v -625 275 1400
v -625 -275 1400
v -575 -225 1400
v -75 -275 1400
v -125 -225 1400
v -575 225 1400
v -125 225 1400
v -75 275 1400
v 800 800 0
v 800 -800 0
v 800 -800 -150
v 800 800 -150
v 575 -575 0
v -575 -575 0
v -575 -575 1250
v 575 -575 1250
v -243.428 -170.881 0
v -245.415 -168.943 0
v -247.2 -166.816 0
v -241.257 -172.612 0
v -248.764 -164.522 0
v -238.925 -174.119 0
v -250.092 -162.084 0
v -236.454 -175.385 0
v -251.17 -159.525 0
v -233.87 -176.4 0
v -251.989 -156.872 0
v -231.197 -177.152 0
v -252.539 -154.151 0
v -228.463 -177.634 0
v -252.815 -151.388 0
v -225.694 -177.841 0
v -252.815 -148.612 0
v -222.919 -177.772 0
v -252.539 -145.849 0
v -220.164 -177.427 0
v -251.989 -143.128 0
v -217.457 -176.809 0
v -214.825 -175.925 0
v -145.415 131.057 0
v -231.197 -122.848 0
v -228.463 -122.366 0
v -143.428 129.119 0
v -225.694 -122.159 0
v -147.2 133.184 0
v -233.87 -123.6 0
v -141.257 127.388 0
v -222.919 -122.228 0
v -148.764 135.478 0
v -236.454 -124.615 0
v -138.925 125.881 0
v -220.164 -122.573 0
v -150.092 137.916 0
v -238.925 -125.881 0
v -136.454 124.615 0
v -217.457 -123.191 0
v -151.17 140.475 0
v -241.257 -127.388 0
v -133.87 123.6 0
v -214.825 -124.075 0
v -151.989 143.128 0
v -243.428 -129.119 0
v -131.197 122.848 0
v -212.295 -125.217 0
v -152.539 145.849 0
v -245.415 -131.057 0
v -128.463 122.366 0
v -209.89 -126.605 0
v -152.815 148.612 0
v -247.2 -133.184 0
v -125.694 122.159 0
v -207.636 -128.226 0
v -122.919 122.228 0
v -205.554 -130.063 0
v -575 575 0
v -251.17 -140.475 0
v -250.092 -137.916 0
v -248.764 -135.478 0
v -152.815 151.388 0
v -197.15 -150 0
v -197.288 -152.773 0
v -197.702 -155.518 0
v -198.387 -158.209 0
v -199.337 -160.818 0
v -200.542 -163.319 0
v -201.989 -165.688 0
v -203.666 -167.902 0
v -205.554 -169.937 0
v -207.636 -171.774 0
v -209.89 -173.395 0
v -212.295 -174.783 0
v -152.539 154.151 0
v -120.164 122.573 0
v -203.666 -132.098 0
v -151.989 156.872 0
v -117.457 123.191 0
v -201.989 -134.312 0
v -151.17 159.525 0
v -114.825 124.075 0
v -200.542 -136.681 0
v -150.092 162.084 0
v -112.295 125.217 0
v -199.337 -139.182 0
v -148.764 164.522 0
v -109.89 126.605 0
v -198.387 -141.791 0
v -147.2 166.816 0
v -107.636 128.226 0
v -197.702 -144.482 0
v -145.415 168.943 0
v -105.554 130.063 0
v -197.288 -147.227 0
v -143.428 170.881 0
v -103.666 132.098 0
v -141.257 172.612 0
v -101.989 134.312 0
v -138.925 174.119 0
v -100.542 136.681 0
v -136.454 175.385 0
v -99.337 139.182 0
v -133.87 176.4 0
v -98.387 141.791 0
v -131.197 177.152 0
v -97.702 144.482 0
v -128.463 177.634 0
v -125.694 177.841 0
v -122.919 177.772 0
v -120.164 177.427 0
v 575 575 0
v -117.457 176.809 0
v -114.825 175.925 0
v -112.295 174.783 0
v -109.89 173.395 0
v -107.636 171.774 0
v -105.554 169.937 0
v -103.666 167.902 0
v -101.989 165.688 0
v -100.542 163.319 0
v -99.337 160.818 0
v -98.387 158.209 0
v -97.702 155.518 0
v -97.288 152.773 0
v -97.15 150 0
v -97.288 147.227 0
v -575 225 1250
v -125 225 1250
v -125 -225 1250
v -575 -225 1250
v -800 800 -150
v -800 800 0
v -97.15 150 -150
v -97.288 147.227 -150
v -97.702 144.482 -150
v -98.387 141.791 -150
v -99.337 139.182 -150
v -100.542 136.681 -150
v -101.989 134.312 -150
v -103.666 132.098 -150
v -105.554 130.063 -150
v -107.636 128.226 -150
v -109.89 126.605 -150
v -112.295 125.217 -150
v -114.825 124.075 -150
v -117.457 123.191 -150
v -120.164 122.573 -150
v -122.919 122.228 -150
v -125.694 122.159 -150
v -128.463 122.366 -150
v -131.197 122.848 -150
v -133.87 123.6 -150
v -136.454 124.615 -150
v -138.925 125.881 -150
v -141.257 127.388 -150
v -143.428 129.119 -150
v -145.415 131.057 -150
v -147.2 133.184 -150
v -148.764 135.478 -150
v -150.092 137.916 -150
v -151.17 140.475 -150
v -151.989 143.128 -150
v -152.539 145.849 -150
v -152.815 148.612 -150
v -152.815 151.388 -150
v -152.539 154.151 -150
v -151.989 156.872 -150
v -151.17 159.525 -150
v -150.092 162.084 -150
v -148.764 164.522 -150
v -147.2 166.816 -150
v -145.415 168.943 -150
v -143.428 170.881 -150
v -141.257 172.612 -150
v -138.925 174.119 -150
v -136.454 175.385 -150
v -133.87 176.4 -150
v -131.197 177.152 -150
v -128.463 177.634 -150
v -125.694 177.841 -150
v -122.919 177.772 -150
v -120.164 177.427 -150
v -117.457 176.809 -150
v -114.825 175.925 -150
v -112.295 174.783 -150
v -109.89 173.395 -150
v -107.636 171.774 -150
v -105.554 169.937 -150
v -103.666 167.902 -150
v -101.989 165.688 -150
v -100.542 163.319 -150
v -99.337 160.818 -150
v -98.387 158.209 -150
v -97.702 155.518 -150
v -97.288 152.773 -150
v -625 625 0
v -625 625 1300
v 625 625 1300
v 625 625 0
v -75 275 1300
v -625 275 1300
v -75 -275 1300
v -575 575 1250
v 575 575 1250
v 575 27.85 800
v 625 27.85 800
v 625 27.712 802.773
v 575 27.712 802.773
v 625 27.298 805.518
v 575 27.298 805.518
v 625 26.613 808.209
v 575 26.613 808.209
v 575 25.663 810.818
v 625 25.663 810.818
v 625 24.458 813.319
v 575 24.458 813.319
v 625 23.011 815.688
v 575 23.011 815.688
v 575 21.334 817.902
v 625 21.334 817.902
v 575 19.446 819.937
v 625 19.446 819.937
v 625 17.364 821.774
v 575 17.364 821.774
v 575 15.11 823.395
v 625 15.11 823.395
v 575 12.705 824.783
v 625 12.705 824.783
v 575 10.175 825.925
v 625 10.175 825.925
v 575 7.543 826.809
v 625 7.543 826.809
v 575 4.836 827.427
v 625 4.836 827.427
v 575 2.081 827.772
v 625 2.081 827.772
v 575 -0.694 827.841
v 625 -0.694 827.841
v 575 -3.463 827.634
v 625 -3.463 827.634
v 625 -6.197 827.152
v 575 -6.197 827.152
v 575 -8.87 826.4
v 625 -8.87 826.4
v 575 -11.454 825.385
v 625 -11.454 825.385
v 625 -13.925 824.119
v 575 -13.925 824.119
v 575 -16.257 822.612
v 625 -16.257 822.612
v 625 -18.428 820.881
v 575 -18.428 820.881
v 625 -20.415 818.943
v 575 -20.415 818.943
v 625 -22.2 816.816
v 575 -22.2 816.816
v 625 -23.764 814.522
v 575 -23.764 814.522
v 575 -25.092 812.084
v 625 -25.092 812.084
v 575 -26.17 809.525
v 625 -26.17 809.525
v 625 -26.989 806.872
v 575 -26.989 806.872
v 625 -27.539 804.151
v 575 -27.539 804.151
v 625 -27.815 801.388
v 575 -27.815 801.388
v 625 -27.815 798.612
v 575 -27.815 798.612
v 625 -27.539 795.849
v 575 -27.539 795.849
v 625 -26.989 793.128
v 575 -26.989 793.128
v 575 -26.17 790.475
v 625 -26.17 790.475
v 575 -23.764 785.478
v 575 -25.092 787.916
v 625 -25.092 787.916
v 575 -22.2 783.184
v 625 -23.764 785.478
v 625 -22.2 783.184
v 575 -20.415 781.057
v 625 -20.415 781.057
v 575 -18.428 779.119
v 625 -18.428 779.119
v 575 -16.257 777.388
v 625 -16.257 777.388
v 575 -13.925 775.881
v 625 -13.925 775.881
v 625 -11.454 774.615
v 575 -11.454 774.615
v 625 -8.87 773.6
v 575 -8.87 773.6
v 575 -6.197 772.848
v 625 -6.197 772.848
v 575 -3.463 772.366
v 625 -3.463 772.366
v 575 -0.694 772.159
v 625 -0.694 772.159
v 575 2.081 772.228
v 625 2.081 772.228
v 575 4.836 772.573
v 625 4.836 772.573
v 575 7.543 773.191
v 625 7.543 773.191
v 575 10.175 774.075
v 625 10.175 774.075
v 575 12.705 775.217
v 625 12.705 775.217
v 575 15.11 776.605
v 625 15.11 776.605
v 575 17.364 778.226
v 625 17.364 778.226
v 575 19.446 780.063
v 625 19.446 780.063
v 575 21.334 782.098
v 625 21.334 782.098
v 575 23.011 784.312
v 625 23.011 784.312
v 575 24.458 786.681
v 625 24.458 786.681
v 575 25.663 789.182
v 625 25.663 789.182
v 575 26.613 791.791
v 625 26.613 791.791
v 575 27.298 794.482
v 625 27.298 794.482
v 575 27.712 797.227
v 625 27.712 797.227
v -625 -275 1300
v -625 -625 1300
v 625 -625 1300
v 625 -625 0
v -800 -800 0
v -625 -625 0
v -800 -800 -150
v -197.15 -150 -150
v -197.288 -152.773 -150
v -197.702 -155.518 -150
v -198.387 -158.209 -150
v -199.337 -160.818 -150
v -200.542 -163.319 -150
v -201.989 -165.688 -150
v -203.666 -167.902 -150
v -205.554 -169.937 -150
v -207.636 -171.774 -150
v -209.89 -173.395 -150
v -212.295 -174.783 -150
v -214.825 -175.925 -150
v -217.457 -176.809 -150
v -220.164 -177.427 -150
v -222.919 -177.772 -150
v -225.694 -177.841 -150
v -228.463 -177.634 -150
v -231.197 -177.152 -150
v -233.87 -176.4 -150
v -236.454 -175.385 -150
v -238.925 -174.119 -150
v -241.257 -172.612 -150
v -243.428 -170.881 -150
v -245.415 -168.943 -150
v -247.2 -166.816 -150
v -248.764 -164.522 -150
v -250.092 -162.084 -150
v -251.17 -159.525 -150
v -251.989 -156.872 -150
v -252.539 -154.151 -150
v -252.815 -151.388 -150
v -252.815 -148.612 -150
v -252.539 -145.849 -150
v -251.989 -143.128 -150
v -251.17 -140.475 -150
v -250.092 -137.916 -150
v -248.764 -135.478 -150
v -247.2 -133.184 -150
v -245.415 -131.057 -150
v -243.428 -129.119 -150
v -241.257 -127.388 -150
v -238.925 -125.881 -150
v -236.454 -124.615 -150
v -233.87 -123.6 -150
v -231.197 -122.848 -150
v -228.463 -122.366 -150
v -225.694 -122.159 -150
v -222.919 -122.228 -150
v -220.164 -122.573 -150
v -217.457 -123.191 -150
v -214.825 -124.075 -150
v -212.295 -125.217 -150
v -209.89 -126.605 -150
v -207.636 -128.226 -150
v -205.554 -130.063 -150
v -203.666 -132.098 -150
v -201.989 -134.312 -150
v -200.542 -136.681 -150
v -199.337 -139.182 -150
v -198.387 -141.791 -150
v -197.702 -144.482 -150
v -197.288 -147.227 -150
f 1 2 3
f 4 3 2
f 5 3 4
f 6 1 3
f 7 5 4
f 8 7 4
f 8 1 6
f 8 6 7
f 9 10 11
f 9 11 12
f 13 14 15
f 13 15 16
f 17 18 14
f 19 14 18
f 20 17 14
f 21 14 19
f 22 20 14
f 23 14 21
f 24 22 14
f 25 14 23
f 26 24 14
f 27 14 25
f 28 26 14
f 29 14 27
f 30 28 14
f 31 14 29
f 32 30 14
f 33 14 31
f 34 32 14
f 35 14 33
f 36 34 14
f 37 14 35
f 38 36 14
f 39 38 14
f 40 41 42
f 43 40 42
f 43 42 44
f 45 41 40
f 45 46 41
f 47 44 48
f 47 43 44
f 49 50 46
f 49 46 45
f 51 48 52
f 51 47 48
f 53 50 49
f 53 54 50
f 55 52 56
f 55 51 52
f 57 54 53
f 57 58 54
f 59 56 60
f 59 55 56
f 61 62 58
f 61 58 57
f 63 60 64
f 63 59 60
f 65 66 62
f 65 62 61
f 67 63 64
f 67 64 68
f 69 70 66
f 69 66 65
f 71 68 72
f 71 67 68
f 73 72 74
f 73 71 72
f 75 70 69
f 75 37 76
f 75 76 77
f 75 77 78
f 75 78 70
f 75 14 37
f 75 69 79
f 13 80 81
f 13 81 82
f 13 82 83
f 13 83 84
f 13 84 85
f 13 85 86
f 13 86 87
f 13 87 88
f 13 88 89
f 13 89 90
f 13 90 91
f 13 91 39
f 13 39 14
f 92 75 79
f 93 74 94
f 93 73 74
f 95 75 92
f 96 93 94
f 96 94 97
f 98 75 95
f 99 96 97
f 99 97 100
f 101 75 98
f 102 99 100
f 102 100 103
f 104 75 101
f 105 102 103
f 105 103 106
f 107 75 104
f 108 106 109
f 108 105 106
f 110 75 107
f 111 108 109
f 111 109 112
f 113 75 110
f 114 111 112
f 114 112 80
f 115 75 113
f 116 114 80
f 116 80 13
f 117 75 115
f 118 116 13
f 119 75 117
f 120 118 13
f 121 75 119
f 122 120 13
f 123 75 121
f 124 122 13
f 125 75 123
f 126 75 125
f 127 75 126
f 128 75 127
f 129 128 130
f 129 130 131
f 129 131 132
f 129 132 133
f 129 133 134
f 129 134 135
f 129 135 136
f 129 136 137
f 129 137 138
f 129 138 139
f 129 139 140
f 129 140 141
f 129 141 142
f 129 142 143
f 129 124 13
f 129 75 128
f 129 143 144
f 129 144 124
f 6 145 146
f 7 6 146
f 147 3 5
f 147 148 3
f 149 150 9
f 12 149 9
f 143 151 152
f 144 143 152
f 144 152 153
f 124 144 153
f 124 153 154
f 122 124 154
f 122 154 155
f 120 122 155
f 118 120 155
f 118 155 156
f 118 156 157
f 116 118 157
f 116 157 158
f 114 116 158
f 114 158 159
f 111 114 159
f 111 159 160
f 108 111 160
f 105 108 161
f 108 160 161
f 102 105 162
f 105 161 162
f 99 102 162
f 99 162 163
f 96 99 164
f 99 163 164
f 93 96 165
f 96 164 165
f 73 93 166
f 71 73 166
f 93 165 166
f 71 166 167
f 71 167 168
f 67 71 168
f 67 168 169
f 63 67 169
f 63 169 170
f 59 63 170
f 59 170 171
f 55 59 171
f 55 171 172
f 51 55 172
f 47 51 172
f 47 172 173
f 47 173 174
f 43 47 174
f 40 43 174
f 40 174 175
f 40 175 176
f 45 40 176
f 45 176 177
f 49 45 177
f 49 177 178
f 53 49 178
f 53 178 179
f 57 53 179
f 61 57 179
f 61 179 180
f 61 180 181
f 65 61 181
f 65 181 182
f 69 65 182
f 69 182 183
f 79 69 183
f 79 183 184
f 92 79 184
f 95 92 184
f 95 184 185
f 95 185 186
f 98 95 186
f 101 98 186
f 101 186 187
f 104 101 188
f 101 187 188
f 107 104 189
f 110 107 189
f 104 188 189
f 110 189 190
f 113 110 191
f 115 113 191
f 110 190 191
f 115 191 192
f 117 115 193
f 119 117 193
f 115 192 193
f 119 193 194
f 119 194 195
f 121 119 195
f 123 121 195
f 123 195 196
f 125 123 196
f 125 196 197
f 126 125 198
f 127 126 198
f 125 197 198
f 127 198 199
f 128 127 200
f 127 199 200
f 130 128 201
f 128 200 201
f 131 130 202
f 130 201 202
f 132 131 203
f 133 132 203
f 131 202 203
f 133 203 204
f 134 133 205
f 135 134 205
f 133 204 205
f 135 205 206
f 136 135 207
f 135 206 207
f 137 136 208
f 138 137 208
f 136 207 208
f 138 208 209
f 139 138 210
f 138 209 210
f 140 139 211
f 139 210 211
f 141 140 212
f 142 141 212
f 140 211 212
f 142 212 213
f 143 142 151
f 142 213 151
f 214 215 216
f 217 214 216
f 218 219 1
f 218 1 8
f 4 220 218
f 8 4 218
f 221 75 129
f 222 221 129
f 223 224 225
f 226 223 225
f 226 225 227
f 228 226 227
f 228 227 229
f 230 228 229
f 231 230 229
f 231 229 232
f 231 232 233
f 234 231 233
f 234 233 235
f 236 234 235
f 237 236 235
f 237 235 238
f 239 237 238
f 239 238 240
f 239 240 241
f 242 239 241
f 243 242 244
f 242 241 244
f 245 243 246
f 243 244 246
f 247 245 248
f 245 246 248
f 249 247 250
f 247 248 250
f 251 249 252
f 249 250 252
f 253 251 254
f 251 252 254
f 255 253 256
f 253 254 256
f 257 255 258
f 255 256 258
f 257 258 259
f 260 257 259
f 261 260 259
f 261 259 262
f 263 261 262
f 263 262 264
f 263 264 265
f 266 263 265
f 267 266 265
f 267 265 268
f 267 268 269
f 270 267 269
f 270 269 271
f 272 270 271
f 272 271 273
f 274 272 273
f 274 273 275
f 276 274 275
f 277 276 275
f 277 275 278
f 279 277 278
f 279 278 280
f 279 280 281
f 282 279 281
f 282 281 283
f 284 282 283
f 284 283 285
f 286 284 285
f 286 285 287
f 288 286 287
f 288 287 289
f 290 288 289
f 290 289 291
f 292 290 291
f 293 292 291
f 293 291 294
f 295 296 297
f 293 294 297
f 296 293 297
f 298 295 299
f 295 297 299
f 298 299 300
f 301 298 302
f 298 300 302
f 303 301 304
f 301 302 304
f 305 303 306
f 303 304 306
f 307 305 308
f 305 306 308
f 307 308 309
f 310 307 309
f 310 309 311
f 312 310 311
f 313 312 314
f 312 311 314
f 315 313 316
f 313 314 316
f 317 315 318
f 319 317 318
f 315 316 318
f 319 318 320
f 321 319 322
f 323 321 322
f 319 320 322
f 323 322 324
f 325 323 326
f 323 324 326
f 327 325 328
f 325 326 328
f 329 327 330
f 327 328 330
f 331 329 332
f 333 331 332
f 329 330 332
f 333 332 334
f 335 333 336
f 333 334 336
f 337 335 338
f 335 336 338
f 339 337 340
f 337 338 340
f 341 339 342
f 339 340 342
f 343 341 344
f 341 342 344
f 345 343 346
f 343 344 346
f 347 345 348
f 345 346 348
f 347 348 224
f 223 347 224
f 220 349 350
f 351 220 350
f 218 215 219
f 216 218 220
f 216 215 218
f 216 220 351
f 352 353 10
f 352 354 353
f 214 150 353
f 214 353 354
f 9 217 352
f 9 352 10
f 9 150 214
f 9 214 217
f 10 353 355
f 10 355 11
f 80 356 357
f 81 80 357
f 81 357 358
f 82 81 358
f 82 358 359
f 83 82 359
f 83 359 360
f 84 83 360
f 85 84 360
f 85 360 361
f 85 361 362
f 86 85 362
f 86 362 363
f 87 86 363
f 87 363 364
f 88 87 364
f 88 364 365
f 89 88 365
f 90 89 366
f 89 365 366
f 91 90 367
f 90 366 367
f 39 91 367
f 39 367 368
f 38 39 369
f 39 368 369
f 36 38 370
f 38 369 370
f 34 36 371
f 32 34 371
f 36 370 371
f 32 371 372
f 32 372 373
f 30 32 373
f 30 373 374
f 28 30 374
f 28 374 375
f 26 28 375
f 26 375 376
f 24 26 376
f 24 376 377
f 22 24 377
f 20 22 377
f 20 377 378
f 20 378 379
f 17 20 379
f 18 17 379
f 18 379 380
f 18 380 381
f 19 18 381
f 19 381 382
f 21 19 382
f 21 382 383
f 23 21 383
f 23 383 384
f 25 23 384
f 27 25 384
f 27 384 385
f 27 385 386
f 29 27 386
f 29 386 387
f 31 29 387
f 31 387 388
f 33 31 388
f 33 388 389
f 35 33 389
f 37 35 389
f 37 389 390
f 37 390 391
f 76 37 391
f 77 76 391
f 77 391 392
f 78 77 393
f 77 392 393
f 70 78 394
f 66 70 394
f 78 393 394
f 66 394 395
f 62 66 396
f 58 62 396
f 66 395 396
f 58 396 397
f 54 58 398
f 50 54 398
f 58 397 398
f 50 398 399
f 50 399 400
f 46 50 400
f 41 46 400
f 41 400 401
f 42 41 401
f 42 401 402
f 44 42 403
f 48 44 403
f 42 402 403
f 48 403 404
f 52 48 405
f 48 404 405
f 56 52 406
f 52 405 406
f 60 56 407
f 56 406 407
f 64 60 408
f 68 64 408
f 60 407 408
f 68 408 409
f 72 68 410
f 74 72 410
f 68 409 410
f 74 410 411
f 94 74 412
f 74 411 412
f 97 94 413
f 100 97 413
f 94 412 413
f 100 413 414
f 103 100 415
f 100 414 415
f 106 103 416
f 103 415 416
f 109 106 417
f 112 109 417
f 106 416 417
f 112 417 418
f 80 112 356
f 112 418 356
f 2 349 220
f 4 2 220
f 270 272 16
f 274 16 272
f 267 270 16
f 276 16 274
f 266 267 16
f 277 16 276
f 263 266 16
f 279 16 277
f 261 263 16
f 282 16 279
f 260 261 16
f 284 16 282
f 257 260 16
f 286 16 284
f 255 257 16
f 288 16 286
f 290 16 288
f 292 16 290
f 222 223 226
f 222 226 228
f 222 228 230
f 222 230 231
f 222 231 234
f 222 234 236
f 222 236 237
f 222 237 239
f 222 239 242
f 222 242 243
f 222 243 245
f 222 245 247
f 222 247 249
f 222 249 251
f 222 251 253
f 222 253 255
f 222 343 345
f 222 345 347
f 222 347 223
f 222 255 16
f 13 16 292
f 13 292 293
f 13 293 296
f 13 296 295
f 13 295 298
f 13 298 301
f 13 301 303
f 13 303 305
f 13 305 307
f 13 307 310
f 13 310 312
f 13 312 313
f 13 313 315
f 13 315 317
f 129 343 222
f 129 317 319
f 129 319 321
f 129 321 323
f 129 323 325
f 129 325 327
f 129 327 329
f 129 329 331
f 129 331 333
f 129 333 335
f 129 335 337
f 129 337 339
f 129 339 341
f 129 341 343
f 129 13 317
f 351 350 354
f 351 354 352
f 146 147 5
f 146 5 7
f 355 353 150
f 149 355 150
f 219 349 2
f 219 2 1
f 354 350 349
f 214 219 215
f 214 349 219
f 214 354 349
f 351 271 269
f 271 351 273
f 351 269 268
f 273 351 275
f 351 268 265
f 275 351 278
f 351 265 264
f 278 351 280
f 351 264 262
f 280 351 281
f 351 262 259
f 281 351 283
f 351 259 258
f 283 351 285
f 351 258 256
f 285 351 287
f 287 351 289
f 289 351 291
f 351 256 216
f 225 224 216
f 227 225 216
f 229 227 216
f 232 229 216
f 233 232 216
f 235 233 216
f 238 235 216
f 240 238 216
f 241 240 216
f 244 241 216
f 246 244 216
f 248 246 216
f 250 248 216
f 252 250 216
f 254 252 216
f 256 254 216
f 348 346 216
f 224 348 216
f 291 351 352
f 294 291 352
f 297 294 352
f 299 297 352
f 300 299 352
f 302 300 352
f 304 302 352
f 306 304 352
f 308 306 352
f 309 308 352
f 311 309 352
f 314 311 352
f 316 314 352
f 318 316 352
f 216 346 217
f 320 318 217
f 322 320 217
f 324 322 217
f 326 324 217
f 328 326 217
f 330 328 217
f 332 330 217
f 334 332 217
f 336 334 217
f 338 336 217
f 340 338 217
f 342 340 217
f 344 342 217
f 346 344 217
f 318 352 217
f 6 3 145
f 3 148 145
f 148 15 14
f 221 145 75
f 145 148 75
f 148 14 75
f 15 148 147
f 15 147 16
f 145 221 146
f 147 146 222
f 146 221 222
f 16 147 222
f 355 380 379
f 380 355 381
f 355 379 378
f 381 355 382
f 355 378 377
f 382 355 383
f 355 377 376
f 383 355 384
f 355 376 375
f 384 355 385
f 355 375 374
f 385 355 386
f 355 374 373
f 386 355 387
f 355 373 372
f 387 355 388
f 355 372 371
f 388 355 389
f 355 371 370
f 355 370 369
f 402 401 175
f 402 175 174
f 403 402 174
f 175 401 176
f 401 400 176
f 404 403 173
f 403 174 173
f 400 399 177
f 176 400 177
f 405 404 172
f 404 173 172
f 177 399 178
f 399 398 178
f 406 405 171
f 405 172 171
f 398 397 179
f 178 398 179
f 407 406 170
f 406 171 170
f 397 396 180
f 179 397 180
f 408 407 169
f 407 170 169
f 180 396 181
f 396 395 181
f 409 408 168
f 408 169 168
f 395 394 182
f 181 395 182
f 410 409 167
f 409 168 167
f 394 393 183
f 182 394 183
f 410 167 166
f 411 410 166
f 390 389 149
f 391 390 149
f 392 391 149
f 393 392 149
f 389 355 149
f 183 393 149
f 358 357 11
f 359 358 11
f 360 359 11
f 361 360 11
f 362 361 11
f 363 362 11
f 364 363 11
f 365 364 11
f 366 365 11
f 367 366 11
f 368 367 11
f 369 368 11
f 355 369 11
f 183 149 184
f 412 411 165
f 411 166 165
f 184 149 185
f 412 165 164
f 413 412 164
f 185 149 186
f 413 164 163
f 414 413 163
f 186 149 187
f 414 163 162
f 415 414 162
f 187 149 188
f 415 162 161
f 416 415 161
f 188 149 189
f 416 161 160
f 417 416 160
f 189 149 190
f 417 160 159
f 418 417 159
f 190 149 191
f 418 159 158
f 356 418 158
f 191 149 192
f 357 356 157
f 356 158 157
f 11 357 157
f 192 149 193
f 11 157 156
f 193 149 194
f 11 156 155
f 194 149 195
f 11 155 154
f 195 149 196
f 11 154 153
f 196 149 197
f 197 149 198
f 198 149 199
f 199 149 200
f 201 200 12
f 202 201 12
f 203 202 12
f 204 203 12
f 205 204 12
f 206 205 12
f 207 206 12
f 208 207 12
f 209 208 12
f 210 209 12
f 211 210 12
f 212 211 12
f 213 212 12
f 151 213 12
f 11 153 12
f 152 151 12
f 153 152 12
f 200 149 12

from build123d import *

# Parameters (mm, degrees)
F0_W      = 1600
F0_H      = 1600
F2_DEPTH  = 150
F1_W      = 1250
F1_H      = 1250
F1_W_2    = 1150
F1_H_2    = 1150
F3_DEPTH  = 1250
F4_W      = 1250
F4_H      = 1250
F4_W_2    = 450
F4_H_2    = 450
F5_DEPTH  = 50
F6_W      = 550
F6_H      = 550
F6_W_2    = 450
F6_H_2    = 450
F7_DEPTH  = 100
F8_R      = 27.85
F9_DEPTH  = 100
F10_R     = 27.85
F11_DEPTH = 200


with BuildPart() as f2:
    # F0 (on Top) → F2 (new body)
    with BuildSketch(Plane.XY):
        Rectangle(F0_W, F0_H)
    extrude(amount=-F2_DEPTH)

    # F1 (on Top) → F3 (join)
    with BuildSketch(Plane.XY):
        Rectangle(F1_W, F1_H)
        Rectangle(F1_W_2, F1_H_2, mode=Mode.SUBTRACT)
    extrude(amount=F3_DEPTH)

    # F4 (on face) → F5 (join)
    with BuildSketch(Plane.XY.offset(1250)):
        Rectangle(F4_W, F4_H)
        with Locations((-350, 0)):
            Rectangle(F4_W_2, F4_H_2, mode=Mode.SUBTRACT)
    extrude(amount=F5_DEPTH)

    # F6 (on face) → F7 (join)
    with BuildSketch(Plane.XY.offset(1300)):
        with Locations((-350, 0)):
            Rectangle(F6_W, F6_H)
        with Locations((-350, 0)):
            Rectangle(F6_W_2, F6_H_2, mode=Mode.SUBTRACT)
    extrude(amount=F7_DEPTH)

    # F8 (on face) → F9 (cut)
    with BuildSketch(Plane.YZ.offset(625)):
        with Locations((0, 800)):
            Circle(F8_R)
    extrude(amount=-F9_DEPTH, mode=Mode.SUBTRACT)

    # F10 (on face) → F11 (cut)
    with BuildSketch(Plane(origin=(0, 0, -150), x_dir=(1, 0, 0), z_dir=(0, 0, -1))):
        with Locations((-125, -150)):
            Circle(F10_R)
        with Locations((-225, 150)):
            Circle(F10_R)
    extrude(amount=-F11_DEPTH, mode=Mode.SUBTRACT)


solid = f2.part
